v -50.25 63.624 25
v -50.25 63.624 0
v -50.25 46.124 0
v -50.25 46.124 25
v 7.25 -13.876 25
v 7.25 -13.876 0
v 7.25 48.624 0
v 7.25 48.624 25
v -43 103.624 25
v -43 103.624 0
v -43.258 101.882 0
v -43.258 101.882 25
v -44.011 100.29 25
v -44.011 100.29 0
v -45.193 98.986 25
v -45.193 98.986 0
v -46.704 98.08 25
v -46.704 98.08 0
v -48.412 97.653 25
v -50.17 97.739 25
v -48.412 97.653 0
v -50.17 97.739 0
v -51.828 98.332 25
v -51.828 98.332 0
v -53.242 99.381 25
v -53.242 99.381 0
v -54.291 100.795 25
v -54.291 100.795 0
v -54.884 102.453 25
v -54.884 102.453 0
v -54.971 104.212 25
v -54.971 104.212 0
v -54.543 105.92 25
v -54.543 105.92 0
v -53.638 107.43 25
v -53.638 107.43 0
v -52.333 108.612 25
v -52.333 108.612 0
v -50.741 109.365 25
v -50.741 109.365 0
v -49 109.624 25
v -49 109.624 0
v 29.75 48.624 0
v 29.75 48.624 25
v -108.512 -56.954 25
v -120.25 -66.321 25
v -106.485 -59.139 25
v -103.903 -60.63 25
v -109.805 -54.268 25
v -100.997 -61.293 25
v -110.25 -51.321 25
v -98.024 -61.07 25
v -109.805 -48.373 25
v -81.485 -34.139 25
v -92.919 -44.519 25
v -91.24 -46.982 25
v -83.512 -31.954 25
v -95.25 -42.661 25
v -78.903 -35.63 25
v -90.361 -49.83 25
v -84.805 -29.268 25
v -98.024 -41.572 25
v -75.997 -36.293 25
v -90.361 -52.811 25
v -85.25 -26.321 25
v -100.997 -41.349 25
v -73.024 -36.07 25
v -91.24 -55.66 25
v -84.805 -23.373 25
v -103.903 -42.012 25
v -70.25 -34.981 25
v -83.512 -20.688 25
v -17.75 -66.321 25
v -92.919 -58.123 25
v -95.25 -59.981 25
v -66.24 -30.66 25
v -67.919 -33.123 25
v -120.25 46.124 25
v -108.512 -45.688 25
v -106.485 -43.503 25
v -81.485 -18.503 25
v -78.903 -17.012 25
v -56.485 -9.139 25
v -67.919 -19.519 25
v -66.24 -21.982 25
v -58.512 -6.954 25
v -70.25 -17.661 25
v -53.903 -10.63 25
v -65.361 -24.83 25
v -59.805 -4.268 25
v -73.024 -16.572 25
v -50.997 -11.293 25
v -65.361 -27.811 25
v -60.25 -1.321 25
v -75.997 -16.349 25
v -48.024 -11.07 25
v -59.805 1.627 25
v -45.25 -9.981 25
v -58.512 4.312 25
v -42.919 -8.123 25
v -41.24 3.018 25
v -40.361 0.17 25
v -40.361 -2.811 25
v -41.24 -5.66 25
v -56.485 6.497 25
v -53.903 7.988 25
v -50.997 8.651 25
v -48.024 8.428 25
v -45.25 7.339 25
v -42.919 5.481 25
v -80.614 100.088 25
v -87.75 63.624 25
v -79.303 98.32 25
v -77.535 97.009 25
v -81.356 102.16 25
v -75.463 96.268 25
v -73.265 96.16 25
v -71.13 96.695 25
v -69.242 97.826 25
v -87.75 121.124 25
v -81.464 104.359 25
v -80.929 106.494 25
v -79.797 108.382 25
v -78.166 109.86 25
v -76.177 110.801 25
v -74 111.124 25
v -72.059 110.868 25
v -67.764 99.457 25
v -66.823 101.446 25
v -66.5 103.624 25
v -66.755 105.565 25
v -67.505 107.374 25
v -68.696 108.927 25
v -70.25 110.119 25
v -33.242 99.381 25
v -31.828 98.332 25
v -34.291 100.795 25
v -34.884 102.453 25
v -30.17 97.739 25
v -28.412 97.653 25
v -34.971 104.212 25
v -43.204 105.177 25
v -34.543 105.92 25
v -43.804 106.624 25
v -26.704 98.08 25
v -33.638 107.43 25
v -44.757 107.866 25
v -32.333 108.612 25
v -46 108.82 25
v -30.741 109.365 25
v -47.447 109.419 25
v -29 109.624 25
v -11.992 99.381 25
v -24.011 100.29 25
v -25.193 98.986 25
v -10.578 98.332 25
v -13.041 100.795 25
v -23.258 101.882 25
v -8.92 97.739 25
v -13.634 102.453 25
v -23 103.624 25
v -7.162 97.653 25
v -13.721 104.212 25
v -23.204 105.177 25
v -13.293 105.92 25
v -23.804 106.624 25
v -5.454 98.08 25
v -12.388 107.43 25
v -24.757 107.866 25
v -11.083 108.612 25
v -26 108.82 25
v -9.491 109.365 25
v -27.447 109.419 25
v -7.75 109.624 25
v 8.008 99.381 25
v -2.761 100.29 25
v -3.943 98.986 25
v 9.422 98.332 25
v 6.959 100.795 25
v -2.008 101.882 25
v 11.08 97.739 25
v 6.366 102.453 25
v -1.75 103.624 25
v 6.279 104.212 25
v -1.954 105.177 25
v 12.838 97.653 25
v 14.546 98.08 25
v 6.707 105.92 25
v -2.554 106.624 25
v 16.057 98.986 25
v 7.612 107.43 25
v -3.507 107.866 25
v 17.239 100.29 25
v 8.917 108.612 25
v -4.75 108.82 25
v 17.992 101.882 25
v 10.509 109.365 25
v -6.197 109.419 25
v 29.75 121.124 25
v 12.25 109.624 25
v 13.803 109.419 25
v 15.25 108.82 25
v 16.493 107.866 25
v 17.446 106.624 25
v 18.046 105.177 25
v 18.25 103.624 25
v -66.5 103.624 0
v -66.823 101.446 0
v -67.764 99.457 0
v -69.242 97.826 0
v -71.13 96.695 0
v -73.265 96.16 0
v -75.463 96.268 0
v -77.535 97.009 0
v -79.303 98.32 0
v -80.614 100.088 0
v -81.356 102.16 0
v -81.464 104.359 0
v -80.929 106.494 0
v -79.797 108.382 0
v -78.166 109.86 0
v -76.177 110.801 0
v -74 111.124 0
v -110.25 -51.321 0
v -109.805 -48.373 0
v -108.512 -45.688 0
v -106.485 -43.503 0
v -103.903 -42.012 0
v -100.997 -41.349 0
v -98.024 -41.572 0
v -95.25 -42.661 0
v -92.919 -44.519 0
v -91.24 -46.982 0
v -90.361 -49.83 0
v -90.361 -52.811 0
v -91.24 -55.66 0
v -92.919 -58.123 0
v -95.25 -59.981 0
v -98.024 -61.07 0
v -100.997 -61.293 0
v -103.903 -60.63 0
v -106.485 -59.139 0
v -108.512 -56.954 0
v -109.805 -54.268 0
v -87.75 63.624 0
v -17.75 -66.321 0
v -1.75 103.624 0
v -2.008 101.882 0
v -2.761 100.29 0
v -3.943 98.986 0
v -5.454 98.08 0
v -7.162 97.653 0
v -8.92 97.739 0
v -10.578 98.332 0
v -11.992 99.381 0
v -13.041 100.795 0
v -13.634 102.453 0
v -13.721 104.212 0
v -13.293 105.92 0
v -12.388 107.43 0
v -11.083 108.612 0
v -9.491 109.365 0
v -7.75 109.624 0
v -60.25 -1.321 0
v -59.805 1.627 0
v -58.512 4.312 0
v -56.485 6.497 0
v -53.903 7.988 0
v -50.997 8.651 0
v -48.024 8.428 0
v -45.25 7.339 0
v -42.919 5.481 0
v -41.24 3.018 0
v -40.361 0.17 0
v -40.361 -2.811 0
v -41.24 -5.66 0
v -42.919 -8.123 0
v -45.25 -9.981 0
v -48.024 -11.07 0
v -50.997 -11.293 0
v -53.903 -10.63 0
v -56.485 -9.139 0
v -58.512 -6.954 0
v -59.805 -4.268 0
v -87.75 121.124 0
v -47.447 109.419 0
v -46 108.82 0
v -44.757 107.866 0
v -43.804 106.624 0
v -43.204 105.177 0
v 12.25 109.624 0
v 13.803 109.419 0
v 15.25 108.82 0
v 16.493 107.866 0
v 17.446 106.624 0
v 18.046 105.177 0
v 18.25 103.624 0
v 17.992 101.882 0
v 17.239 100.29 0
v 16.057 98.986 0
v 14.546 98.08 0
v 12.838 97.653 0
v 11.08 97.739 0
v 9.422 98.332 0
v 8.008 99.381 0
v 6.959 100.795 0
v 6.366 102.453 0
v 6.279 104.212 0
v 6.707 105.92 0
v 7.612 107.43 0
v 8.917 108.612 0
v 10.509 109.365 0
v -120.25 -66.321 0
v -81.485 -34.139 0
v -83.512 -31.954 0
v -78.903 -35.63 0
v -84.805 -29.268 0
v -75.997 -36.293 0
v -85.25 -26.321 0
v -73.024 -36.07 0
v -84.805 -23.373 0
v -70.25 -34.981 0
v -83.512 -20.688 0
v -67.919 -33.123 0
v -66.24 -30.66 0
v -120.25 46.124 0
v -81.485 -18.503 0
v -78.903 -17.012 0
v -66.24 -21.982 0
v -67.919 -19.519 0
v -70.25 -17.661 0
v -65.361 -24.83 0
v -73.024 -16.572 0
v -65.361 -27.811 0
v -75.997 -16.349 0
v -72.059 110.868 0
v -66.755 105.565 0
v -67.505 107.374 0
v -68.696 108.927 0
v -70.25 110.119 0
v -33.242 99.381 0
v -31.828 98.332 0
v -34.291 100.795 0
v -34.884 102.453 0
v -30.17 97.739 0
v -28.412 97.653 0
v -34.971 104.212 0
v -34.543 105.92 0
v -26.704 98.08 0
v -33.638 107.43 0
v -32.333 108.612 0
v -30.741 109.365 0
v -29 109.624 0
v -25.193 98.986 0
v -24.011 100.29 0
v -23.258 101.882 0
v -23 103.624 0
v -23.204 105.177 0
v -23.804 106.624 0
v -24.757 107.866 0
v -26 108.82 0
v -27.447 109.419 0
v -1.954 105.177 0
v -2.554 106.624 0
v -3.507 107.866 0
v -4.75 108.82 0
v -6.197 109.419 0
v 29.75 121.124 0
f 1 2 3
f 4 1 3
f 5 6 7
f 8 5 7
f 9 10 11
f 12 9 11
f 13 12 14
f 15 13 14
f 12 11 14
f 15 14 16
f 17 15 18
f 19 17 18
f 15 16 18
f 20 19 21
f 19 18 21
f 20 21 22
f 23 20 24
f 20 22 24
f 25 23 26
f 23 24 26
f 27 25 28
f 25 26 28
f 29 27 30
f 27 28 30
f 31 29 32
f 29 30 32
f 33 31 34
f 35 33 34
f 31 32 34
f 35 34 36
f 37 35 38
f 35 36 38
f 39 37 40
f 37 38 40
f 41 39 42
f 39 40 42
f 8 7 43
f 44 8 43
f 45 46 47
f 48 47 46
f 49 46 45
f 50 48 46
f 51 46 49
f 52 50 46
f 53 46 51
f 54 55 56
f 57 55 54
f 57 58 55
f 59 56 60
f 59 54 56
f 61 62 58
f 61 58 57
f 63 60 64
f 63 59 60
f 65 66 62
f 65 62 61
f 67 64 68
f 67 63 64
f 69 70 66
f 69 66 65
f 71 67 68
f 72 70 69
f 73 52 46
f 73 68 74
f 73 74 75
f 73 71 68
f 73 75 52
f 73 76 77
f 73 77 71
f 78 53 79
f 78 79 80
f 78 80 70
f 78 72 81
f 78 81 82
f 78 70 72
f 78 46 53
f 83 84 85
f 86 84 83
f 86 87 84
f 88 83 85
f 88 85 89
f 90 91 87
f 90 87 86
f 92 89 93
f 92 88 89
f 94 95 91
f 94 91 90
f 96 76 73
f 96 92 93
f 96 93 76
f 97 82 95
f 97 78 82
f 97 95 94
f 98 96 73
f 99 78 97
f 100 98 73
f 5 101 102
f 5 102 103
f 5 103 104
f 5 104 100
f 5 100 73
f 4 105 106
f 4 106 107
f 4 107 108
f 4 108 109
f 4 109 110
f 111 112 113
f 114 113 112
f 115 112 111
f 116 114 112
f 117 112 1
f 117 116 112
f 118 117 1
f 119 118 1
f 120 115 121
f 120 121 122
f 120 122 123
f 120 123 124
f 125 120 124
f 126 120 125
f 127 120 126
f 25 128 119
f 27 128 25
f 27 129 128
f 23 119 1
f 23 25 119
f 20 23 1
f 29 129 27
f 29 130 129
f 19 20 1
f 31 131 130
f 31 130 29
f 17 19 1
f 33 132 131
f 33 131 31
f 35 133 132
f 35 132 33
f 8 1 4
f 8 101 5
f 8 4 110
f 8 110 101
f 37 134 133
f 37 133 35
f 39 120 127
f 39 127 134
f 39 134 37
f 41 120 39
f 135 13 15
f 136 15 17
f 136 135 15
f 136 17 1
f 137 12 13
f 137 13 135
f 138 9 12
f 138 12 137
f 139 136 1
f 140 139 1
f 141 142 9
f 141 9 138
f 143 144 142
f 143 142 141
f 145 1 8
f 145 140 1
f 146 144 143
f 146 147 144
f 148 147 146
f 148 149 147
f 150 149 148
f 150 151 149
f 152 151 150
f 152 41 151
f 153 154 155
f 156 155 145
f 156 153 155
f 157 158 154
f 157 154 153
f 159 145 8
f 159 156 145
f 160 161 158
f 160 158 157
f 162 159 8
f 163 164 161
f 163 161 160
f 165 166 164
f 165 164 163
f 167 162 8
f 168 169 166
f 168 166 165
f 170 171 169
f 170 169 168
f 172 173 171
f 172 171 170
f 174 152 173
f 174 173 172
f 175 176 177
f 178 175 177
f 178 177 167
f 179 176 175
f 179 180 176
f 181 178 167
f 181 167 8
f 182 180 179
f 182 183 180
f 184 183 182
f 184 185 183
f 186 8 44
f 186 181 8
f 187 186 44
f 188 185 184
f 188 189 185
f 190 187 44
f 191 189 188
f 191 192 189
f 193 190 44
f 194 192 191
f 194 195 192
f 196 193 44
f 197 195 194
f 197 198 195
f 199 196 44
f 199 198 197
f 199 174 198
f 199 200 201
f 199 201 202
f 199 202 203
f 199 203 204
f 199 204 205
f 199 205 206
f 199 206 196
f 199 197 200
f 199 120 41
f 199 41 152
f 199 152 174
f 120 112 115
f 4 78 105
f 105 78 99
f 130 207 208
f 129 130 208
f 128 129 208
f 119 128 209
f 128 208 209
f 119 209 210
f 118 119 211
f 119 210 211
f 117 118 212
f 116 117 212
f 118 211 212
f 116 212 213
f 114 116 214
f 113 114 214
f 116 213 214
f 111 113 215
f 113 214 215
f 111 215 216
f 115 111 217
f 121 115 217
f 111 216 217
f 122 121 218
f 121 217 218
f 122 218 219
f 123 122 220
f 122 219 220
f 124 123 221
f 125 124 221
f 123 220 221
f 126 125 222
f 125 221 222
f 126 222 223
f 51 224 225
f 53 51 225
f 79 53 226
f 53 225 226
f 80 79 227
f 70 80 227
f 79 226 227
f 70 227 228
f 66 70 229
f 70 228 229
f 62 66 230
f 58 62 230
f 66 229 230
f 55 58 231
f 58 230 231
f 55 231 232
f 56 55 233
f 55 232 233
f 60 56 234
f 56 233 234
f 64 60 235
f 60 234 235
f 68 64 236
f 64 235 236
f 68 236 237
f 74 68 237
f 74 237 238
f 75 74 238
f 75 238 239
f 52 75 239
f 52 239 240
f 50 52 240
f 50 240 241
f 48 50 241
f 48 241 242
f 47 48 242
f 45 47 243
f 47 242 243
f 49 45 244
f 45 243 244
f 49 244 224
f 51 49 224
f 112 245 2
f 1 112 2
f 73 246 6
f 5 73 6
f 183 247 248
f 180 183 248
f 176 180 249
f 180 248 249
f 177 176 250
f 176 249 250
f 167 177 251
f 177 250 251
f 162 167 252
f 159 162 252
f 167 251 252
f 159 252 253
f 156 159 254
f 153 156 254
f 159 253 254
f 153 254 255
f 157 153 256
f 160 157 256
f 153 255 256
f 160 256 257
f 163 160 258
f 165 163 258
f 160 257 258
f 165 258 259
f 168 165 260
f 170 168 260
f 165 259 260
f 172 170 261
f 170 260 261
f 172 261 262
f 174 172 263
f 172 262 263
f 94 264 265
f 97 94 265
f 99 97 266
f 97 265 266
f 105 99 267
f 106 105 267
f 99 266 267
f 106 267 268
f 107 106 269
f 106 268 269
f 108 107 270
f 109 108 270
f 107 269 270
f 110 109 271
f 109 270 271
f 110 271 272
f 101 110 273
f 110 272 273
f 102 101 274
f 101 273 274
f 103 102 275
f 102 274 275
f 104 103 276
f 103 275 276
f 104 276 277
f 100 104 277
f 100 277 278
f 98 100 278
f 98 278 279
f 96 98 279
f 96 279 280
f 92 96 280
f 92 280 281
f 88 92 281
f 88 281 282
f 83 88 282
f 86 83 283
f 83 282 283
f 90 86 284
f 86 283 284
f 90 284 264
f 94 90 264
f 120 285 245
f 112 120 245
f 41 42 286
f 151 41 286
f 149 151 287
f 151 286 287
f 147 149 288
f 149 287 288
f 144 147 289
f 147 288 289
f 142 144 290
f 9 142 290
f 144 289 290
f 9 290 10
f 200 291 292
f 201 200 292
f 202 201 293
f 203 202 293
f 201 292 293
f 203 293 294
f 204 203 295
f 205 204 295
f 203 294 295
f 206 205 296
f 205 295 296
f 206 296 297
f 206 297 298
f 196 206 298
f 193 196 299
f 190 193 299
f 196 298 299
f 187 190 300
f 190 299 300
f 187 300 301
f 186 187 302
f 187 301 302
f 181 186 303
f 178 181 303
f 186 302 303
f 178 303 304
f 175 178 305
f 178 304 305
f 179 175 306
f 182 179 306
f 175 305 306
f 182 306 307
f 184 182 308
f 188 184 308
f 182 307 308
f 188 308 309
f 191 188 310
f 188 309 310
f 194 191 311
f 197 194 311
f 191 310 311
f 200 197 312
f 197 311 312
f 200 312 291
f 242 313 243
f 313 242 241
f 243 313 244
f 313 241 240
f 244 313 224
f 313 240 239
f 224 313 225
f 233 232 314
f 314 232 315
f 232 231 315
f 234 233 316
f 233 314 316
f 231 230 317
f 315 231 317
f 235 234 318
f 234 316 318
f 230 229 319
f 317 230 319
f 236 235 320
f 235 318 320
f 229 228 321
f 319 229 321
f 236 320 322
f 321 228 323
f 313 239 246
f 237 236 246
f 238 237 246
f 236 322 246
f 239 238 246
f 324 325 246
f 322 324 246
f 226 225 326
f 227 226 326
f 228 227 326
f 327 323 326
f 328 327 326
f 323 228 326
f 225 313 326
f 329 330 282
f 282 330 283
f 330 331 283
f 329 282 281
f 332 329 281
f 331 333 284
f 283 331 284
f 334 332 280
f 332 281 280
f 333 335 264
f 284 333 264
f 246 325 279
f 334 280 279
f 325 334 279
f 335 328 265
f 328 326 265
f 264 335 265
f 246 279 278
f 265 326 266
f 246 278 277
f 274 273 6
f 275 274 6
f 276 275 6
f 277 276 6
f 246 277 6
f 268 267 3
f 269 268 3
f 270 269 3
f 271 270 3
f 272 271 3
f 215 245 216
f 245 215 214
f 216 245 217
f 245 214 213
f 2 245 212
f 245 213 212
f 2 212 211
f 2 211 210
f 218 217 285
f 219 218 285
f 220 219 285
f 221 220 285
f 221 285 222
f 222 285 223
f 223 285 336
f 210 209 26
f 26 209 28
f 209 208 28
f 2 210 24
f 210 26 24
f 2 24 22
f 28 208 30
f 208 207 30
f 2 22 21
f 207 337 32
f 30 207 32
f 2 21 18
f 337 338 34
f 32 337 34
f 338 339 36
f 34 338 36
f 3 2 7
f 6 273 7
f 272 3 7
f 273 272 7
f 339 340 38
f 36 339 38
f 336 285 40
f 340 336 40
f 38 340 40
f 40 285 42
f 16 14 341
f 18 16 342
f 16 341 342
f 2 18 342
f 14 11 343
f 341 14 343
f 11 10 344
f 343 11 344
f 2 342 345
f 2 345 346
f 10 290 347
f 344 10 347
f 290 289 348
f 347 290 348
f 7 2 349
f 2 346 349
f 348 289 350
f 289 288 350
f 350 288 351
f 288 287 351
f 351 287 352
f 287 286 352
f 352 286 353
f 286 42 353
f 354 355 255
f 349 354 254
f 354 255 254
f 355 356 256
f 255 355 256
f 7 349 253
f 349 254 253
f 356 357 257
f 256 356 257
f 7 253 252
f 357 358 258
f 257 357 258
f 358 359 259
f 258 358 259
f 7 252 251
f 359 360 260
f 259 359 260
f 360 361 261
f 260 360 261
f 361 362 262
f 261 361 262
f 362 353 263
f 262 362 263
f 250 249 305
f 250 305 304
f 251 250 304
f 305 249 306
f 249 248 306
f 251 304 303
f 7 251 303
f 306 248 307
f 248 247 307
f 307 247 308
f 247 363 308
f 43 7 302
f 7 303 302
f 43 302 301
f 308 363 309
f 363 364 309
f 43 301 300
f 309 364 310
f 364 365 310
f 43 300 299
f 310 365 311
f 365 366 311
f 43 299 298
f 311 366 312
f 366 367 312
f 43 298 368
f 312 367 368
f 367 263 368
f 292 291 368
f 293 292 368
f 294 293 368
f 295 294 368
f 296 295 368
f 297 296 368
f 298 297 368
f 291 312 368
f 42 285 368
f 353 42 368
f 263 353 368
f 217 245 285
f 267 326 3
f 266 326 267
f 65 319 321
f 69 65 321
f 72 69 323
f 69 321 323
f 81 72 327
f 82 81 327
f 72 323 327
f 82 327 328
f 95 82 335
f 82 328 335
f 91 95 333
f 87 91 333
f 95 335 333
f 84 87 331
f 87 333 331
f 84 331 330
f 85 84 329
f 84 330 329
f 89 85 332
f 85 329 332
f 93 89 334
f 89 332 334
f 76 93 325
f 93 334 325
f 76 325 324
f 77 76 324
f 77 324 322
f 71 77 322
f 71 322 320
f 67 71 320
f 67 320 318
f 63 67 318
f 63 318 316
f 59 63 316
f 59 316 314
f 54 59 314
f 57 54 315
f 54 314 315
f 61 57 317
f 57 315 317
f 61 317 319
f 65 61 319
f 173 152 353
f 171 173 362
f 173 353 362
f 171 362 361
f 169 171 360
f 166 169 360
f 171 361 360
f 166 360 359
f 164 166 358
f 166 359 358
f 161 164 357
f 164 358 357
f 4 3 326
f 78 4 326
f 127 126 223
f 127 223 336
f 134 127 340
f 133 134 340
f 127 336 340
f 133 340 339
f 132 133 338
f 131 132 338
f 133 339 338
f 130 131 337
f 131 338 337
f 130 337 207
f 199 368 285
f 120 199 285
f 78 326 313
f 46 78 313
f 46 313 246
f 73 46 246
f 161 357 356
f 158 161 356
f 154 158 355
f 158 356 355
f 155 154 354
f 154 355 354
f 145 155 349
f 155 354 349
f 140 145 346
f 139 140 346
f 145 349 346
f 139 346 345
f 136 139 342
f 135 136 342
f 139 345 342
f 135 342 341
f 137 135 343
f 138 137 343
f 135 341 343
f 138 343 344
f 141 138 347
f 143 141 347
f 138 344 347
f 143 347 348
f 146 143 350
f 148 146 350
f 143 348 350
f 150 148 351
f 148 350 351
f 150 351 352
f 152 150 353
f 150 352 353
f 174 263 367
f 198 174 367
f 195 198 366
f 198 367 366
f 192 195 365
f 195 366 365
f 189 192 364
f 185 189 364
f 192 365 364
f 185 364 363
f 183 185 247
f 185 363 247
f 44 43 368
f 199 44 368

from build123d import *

# Parameters (mm, degrees)
F1_DEPTH = 25


with BuildPart() as f1:
    # F0 (on Top) → F1 (new body)
    with BuildSketch(Plane.XY):
        with BuildLine():
            ThreePointArc((18.250306, 103.623616), (16.492946, 107.866257), (12.250306, 109.623616))
            ThreePointArc((12.250306, 109.623616), (8.007665, 99.380976), (18.250306, 103.623616))
        make_face()
        with BuildLine():
            ThreePointArc((-1.749694, 103.623616), (-3.507054, 107.866257), (-7.749694, 109.623616))
            ThreePointArc((-7.749694, 109.623616), (-11.992335, 99.380976), (-1.749694, 103.623616))
        make_face()
        with BuildLine():
            ThreePointArc((-22.999694, 103.623616), (-24.757054, 107.866257), (-28.999694, 109.623616))
            ThreePointArc((-28.999694, 109.623616), (-33.242335, 99.380976), (-22.999694, 103.623616))
        make_face()
        with BuildLine():
            ThreePointArc((-42.999694, 103.623616), (-44.757054, 107.866257), (-48.999694, 109.623616))
            ThreePointArc((-48.999694, 109.623616), (-53.242335, 99.380976), (-42.999694, 103.623616))
        make_face()
        with BuildLine():
            ThreePointArc((-66.499694, 103.623616), (-68.696394, 108.926917), (-73.999694, 111.123616))
            ThreePointArc((-73.999694, 111.123616), (-79.302995, 98.320316), (-66.499694, 103.623616))
        make_face()
        with BuildLine():
            ThreePointArc((-40.249694, -1.320904), (-50.249694, 8.679096), (-60.249694, -1.320904))
            ThreePointArc((-60.249694, -1.320904), (-50.249694, -11.320904), (-40.249694, -1.320904))
        make_face()
        with BuildLine():
            ThreePointArc((-65.249694, -26.320904), (-75.249694, -16.320904), (-85.249694, -26.320904))
            ThreePointArc((-85.249694, -26.320904), (-75.249694, -36.320904), (-65.249694, -26.320904))
        make_face()
        with BuildLine():
            ThreePointArc((-90.249694, -51.320904), (-100.249694, -41.320904), (-110.249694, -51.320904))
            ThreePointArc((-110.249694, -51.320904), (-100.249694, -61.320904), (-90.249694, -51.320904))
        make_face()
        Polygon((-120.249694, -51.320904), (-120.249694, -66.320904), (-100.249694, -66.320904), (-75.249694, -66.320904), (-50.249694, -66.320904), (-17.749694, -66.320904), (7.250306, -13.876384), (7.250306, 48.623616), (29.750306, 48.623616), (29.750306, 103.623616), (29.750306, 121.123616), (12.250306, 121.123616), (-7.749694, 121.123616), (-28.999694, 121.123616), (-48.999694, 121.123616), (-73.999694, 121.123616), (-87.749694, 121.123616), (-87.749694, 63.623616), (-50.249694, 63.623616), (-50.249694, 46.123616), (-120.249694, 46.123616), (-120.249694, -1.320904), (-120.249694, -26.320904), align=None)
        with BuildLine():
            ThreePointArc((-90.249694, -51.320904), (-100.249694, -61.320904), (-110.249694, -51.320904))
            ThreePointArc((-110.249694, -51.320904), (-100.249694, -41.320904), (-90.249694, -51.320904))
        make_face(mode=Mode.SUBTRACT)
        with BuildLine():
            ThreePointArc((-65.249694, -26.320904), (-75.249694, -36.320904), (-85.249694, -26.320904))
            ThreePointArc((-85.249694, -26.320904), (-75.249694, -16.320904), (-65.249694, -26.320904))
        make_face(mode=Mode.SUBTRACT)
        with BuildLine():
            ThreePointArc((-40.249694, -1.320904), (-50.249694, -11.320904), (-60.249694, -1.320904))
            ThreePointArc((-60.249694, -1.320904), (-50.249694, 8.679096), (-40.249694, -1.320904))
        make_face(mode=Mode.SUBTRACT)
        with BuildLine():
            ThreePointArc((-66.499694, 103.623616), (-79.302995, 98.320316), (-73.999694, 111.123616))
            ThreePointArc((-73.999694, 111.123616), (-68.696394, 108.926917), (-66.499694, 103.623616))
        make_face(mode=Mode.SUBTRACT)
        with BuildLine():
            ThreePointArc((-42.999694, 103.623616), (-53.242335, 99.380976), (-48.999694, 109.623616))
            ThreePointArc((-48.999694, 109.623616), (-44.757054, 107.866257), (-42.999694, 103.623616))
        make_face(mode=Mode.SUBTRACT)
        with BuildLine():
            ThreePointArc((-22.999694, 103.623616), (-33.242335, 99.380976), (-28.999694, 109.623616))
            ThreePointArc((-28.999694, 109.623616), (-24.757054, 107.866257), (-22.999694, 103.623616))
        make_face(mode=Mode.SUBTRACT)
        with BuildLine():
            ThreePointArc((-1.749694, 103.623616), (-11.992335, 99.380976), (-7.749694, 109.623616))
            ThreePointArc((-7.749694, 109.623616), (-3.507054, 107.866257), (-1.749694, 103.623616))
        make_face(mode=Mode.SUBTRACT)
        with BuildLine():
            ThreePointArc((18.250306, 103.623616), (8.007665, 99.380976), (12.250306, 109.623616))
            ThreePointArc((12.250306, 109.623616), (16.492946, 107.866257), (18.250306, 103.623616))
        make_face(mode=Mode.SUBTRACT)
    extrude(amount=F1_DEPTH)


solid = f1.part
